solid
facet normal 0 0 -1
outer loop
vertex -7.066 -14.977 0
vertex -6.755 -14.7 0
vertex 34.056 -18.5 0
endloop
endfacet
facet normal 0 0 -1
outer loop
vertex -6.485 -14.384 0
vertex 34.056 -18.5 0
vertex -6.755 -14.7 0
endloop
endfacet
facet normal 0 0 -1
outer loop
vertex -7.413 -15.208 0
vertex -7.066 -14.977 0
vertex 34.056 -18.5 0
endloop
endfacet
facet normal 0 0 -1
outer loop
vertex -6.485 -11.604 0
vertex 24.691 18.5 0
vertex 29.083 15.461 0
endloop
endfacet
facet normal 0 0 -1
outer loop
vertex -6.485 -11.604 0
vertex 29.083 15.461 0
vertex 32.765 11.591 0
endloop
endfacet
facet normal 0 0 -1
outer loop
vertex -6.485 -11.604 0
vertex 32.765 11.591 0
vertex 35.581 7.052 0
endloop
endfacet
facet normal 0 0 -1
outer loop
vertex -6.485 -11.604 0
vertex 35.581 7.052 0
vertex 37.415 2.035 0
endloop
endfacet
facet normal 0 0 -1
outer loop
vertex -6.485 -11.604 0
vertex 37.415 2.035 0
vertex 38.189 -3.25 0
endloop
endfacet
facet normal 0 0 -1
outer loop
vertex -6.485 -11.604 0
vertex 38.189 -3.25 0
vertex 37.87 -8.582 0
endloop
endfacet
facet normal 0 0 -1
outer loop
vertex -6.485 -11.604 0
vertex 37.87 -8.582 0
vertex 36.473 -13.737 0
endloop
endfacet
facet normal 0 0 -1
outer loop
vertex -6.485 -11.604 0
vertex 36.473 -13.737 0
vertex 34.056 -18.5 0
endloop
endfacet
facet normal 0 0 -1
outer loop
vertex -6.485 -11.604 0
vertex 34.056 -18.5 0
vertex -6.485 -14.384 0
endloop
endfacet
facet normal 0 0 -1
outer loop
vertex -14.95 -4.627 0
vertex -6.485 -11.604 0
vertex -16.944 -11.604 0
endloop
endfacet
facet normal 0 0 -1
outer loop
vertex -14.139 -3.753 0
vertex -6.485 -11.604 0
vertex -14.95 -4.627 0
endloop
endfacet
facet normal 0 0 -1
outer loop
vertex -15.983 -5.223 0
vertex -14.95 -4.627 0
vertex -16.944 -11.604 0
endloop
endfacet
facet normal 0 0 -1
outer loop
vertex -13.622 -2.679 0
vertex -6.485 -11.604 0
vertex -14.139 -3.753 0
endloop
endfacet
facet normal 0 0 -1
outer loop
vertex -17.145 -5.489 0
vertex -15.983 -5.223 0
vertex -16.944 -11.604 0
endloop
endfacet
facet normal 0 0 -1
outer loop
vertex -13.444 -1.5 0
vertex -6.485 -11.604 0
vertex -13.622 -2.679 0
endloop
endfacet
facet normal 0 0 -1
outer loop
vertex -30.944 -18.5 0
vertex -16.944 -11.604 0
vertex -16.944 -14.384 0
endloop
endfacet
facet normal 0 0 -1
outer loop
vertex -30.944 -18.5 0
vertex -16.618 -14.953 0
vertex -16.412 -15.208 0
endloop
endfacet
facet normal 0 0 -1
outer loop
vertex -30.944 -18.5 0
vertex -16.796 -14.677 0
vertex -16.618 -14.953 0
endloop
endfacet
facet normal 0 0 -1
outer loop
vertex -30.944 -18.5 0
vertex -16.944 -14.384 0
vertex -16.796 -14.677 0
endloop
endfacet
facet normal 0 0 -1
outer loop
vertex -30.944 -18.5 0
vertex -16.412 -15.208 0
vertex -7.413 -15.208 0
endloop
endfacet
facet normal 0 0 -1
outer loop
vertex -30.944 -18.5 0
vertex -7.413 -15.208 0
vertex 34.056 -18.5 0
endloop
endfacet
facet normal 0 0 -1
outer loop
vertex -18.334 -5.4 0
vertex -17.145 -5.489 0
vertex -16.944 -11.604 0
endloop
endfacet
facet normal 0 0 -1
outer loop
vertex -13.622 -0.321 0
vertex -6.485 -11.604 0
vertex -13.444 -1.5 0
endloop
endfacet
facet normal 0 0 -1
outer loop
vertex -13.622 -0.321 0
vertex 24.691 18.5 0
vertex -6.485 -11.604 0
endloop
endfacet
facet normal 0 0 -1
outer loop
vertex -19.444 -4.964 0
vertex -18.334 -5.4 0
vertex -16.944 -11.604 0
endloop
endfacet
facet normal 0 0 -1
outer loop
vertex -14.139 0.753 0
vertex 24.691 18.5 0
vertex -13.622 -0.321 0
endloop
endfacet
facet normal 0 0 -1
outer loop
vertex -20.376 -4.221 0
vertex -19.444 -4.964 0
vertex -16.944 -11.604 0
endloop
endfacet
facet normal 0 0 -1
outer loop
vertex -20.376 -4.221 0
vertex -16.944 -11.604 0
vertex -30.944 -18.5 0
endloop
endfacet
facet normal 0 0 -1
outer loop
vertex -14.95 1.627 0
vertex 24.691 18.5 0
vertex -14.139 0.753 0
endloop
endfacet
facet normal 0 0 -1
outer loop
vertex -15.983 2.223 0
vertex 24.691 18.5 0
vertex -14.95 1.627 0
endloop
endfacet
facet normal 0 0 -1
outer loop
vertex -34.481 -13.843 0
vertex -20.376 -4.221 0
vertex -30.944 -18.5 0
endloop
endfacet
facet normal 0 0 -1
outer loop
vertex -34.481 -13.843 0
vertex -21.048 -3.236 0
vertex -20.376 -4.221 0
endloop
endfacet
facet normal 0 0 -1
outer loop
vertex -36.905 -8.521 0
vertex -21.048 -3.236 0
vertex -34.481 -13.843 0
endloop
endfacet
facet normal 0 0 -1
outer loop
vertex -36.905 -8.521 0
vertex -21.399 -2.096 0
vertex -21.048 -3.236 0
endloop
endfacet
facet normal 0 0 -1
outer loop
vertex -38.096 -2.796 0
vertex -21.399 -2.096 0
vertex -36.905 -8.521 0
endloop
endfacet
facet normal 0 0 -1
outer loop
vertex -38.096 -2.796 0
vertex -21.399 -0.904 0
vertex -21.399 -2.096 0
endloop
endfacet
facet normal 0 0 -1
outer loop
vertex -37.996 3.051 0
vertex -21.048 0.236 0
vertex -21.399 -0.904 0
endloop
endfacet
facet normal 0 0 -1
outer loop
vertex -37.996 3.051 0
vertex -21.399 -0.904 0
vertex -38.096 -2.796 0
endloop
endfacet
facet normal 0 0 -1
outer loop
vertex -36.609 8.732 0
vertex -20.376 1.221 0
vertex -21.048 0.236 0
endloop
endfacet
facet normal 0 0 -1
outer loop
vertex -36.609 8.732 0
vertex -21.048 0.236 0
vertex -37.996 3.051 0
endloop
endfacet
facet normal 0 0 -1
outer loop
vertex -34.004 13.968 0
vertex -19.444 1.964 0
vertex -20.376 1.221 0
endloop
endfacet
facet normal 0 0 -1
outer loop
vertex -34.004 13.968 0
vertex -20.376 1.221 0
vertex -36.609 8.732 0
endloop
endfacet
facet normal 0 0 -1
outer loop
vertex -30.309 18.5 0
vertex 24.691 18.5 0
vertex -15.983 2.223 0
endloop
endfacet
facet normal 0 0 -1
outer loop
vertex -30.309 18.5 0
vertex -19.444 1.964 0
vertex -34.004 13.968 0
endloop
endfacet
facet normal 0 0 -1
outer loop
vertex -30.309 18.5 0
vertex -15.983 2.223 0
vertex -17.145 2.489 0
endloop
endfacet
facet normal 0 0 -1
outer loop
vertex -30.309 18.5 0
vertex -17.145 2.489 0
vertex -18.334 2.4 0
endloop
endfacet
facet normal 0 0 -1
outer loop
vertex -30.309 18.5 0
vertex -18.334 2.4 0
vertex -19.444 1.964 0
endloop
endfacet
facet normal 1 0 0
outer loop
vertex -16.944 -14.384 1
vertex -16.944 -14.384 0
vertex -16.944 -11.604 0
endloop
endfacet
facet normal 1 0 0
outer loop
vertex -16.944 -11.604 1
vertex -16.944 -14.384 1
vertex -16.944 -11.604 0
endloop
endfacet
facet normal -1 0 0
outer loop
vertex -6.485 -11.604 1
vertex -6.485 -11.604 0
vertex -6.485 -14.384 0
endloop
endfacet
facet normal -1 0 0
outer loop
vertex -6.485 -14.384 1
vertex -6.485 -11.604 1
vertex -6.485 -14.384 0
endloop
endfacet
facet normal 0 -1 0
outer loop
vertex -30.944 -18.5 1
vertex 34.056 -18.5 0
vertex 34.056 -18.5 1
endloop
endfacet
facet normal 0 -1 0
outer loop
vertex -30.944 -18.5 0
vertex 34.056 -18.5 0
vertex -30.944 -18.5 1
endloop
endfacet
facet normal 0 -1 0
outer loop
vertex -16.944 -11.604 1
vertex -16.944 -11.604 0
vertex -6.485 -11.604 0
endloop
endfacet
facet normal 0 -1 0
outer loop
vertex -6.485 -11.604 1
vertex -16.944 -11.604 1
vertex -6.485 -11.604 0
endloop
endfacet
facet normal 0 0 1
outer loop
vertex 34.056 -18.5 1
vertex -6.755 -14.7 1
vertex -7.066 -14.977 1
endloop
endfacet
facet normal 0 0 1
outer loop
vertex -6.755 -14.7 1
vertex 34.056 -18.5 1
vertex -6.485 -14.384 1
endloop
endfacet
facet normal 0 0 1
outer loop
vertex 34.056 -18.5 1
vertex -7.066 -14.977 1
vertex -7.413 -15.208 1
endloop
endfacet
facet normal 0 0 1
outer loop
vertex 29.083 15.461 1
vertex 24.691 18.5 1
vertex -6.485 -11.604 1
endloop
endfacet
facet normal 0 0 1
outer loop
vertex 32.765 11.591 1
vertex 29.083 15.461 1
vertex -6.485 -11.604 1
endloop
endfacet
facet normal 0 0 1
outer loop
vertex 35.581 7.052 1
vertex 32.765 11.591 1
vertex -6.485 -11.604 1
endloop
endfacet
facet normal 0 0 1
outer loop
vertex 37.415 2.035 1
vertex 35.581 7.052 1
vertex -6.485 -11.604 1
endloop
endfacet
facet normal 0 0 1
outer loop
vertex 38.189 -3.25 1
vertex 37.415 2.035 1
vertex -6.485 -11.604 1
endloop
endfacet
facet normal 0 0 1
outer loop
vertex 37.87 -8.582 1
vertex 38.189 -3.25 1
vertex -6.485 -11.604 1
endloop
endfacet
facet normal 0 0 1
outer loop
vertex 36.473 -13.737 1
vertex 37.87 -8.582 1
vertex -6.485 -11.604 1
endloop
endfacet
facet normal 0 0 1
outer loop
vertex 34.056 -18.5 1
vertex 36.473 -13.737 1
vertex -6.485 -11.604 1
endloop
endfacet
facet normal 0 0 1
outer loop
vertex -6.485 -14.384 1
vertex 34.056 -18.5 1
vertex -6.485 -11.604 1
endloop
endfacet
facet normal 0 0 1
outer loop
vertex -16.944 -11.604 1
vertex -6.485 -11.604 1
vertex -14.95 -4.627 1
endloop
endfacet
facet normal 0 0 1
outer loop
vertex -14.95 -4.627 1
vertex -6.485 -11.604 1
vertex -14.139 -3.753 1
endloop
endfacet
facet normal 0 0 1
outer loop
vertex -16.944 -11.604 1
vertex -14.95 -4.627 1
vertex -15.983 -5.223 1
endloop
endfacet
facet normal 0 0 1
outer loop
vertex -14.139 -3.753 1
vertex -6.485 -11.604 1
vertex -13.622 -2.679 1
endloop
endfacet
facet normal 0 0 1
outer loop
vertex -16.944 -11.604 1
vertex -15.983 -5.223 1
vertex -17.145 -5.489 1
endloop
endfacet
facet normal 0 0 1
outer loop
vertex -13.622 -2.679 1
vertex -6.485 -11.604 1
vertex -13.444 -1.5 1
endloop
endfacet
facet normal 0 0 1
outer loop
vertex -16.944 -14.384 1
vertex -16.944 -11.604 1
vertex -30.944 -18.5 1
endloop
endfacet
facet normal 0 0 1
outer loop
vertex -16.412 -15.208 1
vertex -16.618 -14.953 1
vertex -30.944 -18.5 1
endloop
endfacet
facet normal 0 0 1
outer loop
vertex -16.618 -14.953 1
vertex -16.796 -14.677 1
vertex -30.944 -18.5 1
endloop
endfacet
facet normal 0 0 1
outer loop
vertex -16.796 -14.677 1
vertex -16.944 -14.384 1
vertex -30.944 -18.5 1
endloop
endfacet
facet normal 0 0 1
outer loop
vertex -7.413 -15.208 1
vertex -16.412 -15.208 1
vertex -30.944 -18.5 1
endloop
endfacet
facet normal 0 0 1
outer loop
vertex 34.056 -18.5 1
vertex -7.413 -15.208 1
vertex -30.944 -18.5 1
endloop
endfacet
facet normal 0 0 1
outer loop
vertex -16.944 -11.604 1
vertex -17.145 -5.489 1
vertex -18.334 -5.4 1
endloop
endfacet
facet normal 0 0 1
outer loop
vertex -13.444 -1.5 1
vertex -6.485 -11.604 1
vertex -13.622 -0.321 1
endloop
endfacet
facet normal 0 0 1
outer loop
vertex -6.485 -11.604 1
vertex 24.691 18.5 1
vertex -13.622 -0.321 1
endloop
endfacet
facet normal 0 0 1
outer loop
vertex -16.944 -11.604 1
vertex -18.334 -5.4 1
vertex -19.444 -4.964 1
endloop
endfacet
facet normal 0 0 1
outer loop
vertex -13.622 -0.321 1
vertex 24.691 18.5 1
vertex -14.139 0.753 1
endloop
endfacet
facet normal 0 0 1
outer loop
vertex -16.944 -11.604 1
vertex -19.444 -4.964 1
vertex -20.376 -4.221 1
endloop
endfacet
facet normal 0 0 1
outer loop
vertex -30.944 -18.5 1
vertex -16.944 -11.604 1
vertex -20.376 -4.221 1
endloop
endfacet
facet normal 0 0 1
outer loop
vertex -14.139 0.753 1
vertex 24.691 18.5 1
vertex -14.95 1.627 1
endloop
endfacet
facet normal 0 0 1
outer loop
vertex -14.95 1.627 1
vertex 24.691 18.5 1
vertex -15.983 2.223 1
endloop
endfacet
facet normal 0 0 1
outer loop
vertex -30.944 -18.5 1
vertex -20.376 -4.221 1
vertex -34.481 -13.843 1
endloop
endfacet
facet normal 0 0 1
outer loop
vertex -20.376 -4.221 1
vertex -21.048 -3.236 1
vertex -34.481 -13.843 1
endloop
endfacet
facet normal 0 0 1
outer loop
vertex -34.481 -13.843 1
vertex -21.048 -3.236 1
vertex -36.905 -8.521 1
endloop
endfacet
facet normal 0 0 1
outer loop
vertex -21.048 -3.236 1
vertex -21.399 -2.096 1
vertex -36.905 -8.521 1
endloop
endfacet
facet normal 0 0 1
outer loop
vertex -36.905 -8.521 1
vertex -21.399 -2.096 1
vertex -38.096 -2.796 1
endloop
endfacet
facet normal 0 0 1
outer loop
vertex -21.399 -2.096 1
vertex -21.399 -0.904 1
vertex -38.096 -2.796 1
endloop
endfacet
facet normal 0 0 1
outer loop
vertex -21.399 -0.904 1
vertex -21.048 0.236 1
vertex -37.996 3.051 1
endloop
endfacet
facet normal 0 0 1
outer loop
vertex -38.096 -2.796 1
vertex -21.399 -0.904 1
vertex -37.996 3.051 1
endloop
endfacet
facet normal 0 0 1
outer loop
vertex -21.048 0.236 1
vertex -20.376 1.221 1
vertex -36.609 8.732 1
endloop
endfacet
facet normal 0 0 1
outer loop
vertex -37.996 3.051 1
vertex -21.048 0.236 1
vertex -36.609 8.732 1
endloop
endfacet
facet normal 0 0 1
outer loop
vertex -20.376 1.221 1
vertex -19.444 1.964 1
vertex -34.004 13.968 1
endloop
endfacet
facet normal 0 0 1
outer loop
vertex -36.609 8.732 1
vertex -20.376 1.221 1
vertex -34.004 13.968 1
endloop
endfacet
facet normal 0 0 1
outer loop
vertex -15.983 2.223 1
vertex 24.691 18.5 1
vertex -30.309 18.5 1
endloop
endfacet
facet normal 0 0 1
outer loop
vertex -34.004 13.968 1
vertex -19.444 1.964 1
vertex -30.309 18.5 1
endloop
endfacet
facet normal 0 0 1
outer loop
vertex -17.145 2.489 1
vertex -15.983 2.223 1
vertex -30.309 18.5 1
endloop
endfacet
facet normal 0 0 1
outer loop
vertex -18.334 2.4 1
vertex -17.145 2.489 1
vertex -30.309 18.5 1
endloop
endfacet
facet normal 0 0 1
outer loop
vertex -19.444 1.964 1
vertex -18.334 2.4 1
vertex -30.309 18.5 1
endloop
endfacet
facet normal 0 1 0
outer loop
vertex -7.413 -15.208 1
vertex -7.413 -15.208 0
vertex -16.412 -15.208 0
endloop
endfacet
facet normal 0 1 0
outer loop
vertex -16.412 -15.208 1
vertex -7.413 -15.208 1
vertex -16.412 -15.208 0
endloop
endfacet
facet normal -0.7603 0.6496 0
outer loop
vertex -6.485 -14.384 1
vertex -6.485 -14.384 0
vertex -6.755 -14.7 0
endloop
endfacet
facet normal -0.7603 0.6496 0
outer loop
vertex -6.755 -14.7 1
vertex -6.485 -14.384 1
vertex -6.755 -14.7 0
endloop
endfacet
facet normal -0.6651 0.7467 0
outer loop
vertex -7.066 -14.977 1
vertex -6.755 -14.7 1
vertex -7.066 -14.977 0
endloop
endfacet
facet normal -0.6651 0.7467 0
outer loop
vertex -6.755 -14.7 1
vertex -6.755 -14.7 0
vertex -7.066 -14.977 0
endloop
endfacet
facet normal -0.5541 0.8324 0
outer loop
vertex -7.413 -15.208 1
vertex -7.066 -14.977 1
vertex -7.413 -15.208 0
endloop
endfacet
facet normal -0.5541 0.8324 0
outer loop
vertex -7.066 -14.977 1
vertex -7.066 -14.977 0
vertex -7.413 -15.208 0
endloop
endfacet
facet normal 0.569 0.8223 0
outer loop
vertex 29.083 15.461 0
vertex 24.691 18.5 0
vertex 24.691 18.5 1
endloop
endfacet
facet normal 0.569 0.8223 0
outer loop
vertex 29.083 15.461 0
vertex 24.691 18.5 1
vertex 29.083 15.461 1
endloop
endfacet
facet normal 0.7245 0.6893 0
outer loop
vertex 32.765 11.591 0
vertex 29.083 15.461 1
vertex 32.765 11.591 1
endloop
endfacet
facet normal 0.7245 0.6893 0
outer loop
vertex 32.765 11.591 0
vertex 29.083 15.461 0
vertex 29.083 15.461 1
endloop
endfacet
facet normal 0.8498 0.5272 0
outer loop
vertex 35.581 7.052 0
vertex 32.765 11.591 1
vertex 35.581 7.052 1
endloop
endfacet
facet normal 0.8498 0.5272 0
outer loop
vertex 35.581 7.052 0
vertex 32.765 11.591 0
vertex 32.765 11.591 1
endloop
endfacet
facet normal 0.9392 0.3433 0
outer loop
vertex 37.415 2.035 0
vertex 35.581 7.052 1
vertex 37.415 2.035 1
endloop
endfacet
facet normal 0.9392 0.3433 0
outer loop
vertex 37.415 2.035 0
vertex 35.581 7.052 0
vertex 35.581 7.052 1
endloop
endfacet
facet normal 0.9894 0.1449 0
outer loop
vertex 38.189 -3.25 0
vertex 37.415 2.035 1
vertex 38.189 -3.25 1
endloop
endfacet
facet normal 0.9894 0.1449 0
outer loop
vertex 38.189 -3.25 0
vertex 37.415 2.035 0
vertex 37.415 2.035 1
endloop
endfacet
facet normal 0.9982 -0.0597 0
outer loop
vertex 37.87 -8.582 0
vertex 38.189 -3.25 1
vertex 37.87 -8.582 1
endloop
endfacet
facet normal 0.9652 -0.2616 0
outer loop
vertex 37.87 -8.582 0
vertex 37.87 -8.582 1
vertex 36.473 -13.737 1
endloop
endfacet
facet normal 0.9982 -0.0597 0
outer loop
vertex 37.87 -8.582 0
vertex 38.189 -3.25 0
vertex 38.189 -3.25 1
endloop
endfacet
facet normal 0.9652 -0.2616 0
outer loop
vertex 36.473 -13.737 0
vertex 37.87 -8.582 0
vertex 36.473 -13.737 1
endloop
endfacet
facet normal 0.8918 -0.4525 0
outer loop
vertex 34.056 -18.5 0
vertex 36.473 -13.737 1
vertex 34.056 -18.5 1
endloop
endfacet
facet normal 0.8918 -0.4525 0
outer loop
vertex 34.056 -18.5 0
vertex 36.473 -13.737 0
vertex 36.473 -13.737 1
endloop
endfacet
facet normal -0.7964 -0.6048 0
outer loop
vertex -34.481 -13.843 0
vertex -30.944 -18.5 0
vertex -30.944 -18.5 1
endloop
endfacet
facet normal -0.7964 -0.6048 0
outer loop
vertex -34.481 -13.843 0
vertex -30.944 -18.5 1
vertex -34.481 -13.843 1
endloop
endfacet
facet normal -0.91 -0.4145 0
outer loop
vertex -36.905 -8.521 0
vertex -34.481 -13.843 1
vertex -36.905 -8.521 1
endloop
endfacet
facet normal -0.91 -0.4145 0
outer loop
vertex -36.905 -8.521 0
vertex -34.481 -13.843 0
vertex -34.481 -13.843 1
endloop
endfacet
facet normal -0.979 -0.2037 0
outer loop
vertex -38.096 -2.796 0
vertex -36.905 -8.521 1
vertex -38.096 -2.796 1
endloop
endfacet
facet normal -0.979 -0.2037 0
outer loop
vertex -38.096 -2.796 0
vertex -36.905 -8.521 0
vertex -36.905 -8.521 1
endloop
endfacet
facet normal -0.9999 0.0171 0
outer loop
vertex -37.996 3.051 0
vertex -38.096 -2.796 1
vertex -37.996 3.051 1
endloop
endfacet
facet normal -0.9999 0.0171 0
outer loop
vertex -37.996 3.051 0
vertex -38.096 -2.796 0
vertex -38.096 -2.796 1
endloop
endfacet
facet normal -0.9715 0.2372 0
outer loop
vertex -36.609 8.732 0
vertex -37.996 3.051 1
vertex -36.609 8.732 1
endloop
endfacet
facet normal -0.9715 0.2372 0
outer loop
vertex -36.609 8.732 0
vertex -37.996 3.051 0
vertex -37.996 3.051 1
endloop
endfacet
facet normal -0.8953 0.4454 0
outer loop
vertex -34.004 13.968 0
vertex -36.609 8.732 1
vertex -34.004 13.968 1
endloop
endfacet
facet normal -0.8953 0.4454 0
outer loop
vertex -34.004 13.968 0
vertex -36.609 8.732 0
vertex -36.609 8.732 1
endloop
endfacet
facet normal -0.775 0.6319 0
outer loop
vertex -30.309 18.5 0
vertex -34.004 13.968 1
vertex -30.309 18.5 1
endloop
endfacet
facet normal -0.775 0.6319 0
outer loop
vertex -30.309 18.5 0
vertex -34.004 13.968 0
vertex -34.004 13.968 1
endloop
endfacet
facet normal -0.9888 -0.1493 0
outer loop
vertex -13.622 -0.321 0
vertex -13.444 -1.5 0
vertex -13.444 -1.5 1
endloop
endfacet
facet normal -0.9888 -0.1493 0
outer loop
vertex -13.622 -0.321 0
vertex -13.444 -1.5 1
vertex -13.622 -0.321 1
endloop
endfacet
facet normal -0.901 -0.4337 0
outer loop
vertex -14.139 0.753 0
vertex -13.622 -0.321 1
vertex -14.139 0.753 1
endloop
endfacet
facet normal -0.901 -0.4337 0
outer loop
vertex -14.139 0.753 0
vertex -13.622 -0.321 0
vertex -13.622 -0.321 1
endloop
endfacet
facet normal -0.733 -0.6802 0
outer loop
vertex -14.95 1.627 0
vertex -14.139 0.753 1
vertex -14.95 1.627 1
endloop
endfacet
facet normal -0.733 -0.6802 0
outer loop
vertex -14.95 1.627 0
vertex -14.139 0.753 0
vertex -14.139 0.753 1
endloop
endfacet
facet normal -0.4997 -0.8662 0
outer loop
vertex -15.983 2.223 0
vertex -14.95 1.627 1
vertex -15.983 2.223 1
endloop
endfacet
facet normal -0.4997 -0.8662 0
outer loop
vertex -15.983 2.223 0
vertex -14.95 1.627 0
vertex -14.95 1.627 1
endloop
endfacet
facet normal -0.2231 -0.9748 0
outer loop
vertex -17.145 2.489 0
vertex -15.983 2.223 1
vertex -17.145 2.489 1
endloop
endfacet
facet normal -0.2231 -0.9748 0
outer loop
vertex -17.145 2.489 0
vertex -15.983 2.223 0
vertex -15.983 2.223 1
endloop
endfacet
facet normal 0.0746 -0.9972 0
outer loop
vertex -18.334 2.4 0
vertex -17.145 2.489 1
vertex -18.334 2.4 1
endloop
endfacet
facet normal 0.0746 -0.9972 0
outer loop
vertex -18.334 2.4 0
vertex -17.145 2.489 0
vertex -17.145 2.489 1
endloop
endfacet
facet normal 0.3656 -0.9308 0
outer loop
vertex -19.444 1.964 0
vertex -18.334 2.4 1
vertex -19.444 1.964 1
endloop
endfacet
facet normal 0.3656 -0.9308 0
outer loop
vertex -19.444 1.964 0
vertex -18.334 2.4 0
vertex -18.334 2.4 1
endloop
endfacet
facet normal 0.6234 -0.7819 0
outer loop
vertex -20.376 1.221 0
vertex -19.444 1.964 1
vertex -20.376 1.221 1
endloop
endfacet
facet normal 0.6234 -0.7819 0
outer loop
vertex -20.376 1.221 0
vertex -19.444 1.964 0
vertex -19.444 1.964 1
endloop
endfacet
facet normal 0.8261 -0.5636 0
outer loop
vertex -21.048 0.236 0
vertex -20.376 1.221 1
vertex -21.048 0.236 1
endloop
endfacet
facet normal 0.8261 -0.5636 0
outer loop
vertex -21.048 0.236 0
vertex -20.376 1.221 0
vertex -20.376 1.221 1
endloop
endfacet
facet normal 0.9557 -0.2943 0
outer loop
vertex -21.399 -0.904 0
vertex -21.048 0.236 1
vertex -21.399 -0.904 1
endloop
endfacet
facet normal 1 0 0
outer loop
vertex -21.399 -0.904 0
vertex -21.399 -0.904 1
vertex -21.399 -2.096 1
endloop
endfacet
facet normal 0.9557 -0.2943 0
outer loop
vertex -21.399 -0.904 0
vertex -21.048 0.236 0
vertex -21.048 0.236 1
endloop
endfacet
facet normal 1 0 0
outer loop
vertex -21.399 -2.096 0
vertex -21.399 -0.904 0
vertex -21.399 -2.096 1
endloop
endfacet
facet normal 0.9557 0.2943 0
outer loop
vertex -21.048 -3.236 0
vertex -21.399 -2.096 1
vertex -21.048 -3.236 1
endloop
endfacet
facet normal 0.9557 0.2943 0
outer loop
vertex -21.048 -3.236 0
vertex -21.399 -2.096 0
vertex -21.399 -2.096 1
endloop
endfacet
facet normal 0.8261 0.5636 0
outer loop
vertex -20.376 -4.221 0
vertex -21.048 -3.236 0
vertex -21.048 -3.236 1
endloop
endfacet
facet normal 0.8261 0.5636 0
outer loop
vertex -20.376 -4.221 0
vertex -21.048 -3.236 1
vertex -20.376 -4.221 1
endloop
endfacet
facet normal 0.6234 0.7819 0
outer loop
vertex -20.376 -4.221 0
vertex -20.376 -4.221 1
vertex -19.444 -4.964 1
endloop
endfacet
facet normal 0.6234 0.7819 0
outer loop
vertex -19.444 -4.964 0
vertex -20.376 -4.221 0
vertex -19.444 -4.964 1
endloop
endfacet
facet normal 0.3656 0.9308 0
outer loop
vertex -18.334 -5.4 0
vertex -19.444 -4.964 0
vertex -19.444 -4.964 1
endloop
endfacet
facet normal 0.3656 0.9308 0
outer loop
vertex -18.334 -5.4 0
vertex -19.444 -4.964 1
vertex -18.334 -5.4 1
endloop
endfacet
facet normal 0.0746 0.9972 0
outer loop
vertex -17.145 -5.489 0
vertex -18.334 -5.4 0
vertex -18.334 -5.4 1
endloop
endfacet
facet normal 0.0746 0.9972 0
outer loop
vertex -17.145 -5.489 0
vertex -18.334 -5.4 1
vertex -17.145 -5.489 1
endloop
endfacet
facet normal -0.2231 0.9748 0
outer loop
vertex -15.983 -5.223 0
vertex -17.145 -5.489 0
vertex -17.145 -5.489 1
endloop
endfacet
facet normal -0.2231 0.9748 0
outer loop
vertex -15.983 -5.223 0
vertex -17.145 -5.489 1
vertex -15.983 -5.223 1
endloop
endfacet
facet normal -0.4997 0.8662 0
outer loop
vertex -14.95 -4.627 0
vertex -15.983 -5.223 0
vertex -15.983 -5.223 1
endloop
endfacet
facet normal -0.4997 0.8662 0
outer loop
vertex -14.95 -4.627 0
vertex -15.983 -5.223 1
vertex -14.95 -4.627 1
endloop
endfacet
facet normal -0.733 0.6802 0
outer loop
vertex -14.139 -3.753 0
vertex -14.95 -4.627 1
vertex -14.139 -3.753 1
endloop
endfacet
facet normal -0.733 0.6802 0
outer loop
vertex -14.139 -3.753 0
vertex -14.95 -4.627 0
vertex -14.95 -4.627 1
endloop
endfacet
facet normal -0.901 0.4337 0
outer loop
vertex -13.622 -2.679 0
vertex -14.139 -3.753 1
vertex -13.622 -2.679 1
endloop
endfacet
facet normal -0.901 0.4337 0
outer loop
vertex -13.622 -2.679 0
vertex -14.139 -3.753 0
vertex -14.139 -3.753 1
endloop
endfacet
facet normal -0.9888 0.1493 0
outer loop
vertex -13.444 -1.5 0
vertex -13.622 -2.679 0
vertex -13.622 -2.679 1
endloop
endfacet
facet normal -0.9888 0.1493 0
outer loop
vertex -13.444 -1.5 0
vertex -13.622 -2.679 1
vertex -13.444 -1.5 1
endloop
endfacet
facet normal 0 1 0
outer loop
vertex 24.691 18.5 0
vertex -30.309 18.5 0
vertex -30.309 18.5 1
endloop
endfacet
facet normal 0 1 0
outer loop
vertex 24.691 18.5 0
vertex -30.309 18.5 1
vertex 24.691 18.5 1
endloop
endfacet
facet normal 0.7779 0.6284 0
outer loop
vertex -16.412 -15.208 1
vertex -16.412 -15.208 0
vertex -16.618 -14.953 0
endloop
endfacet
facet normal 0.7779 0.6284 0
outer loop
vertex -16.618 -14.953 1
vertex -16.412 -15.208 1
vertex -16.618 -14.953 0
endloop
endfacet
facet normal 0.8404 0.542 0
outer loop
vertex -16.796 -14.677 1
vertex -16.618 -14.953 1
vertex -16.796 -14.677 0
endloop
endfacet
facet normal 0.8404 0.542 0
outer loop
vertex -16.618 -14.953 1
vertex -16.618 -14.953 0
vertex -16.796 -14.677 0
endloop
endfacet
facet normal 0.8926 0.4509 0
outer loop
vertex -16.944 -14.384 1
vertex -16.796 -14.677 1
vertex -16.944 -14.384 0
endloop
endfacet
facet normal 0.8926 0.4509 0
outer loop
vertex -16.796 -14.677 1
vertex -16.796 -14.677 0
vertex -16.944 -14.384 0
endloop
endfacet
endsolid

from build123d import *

# Parameters (mm, degrees)
SKETCH_1_R      = 4
EXTRUDE_1_DEPTH = 1


with BuildPart() as part:
    # 草图1 → 凸台-拉伸1 (new body)
    with BuildSketch(Plane.XY):
        with BuildLine():
            Line((-30.308871265, 18.5), (24.691128735, 18.5))
            ThreePointArc((24.691128735, 18.5), (37.414867681, 2.03528305), (34.05591144, -18.5))
            Line((34.05591144, -18.5), (-30.94408856, -18.5))
            ThreePointArc((-30.94408856, -18.5), (-38.208814547, 0.130173786), (-30.308871265, 18.5))
        make_face()
        with Locations((-17.44408856, -1.5)):
            Circle(SKETCH_1_R, mode=Mode.SUBTRACT)
        with BuildLine():
            Line((-16.94408856, -11.603927424), (-6.484848095, -11.603927424))
            Line((-6.484848095, -11.603927424), (-6.484848095, -14.383556294))
            ThreePointArc((-6.484848095, -14.383556294), (-6.906034088, -14.843943267), (-7.412736188, -15.208095416))
            Line((-7.412736188, -15.208095416), (-16.411800764, -15.208095416))
            ThreePointArc((-16.411800764, -15.208095416), (-16.710853614, -14.817070491), (-16.94408856, -14.383556294))
            Line((-16.94408856, -14.383556294), (-16.94408856, -11.603927424))
        make_face(mode=Mode.SUBTRACT)
    extrude(amount=EXTRUDE_1_DEPTH)


solid = part.part
